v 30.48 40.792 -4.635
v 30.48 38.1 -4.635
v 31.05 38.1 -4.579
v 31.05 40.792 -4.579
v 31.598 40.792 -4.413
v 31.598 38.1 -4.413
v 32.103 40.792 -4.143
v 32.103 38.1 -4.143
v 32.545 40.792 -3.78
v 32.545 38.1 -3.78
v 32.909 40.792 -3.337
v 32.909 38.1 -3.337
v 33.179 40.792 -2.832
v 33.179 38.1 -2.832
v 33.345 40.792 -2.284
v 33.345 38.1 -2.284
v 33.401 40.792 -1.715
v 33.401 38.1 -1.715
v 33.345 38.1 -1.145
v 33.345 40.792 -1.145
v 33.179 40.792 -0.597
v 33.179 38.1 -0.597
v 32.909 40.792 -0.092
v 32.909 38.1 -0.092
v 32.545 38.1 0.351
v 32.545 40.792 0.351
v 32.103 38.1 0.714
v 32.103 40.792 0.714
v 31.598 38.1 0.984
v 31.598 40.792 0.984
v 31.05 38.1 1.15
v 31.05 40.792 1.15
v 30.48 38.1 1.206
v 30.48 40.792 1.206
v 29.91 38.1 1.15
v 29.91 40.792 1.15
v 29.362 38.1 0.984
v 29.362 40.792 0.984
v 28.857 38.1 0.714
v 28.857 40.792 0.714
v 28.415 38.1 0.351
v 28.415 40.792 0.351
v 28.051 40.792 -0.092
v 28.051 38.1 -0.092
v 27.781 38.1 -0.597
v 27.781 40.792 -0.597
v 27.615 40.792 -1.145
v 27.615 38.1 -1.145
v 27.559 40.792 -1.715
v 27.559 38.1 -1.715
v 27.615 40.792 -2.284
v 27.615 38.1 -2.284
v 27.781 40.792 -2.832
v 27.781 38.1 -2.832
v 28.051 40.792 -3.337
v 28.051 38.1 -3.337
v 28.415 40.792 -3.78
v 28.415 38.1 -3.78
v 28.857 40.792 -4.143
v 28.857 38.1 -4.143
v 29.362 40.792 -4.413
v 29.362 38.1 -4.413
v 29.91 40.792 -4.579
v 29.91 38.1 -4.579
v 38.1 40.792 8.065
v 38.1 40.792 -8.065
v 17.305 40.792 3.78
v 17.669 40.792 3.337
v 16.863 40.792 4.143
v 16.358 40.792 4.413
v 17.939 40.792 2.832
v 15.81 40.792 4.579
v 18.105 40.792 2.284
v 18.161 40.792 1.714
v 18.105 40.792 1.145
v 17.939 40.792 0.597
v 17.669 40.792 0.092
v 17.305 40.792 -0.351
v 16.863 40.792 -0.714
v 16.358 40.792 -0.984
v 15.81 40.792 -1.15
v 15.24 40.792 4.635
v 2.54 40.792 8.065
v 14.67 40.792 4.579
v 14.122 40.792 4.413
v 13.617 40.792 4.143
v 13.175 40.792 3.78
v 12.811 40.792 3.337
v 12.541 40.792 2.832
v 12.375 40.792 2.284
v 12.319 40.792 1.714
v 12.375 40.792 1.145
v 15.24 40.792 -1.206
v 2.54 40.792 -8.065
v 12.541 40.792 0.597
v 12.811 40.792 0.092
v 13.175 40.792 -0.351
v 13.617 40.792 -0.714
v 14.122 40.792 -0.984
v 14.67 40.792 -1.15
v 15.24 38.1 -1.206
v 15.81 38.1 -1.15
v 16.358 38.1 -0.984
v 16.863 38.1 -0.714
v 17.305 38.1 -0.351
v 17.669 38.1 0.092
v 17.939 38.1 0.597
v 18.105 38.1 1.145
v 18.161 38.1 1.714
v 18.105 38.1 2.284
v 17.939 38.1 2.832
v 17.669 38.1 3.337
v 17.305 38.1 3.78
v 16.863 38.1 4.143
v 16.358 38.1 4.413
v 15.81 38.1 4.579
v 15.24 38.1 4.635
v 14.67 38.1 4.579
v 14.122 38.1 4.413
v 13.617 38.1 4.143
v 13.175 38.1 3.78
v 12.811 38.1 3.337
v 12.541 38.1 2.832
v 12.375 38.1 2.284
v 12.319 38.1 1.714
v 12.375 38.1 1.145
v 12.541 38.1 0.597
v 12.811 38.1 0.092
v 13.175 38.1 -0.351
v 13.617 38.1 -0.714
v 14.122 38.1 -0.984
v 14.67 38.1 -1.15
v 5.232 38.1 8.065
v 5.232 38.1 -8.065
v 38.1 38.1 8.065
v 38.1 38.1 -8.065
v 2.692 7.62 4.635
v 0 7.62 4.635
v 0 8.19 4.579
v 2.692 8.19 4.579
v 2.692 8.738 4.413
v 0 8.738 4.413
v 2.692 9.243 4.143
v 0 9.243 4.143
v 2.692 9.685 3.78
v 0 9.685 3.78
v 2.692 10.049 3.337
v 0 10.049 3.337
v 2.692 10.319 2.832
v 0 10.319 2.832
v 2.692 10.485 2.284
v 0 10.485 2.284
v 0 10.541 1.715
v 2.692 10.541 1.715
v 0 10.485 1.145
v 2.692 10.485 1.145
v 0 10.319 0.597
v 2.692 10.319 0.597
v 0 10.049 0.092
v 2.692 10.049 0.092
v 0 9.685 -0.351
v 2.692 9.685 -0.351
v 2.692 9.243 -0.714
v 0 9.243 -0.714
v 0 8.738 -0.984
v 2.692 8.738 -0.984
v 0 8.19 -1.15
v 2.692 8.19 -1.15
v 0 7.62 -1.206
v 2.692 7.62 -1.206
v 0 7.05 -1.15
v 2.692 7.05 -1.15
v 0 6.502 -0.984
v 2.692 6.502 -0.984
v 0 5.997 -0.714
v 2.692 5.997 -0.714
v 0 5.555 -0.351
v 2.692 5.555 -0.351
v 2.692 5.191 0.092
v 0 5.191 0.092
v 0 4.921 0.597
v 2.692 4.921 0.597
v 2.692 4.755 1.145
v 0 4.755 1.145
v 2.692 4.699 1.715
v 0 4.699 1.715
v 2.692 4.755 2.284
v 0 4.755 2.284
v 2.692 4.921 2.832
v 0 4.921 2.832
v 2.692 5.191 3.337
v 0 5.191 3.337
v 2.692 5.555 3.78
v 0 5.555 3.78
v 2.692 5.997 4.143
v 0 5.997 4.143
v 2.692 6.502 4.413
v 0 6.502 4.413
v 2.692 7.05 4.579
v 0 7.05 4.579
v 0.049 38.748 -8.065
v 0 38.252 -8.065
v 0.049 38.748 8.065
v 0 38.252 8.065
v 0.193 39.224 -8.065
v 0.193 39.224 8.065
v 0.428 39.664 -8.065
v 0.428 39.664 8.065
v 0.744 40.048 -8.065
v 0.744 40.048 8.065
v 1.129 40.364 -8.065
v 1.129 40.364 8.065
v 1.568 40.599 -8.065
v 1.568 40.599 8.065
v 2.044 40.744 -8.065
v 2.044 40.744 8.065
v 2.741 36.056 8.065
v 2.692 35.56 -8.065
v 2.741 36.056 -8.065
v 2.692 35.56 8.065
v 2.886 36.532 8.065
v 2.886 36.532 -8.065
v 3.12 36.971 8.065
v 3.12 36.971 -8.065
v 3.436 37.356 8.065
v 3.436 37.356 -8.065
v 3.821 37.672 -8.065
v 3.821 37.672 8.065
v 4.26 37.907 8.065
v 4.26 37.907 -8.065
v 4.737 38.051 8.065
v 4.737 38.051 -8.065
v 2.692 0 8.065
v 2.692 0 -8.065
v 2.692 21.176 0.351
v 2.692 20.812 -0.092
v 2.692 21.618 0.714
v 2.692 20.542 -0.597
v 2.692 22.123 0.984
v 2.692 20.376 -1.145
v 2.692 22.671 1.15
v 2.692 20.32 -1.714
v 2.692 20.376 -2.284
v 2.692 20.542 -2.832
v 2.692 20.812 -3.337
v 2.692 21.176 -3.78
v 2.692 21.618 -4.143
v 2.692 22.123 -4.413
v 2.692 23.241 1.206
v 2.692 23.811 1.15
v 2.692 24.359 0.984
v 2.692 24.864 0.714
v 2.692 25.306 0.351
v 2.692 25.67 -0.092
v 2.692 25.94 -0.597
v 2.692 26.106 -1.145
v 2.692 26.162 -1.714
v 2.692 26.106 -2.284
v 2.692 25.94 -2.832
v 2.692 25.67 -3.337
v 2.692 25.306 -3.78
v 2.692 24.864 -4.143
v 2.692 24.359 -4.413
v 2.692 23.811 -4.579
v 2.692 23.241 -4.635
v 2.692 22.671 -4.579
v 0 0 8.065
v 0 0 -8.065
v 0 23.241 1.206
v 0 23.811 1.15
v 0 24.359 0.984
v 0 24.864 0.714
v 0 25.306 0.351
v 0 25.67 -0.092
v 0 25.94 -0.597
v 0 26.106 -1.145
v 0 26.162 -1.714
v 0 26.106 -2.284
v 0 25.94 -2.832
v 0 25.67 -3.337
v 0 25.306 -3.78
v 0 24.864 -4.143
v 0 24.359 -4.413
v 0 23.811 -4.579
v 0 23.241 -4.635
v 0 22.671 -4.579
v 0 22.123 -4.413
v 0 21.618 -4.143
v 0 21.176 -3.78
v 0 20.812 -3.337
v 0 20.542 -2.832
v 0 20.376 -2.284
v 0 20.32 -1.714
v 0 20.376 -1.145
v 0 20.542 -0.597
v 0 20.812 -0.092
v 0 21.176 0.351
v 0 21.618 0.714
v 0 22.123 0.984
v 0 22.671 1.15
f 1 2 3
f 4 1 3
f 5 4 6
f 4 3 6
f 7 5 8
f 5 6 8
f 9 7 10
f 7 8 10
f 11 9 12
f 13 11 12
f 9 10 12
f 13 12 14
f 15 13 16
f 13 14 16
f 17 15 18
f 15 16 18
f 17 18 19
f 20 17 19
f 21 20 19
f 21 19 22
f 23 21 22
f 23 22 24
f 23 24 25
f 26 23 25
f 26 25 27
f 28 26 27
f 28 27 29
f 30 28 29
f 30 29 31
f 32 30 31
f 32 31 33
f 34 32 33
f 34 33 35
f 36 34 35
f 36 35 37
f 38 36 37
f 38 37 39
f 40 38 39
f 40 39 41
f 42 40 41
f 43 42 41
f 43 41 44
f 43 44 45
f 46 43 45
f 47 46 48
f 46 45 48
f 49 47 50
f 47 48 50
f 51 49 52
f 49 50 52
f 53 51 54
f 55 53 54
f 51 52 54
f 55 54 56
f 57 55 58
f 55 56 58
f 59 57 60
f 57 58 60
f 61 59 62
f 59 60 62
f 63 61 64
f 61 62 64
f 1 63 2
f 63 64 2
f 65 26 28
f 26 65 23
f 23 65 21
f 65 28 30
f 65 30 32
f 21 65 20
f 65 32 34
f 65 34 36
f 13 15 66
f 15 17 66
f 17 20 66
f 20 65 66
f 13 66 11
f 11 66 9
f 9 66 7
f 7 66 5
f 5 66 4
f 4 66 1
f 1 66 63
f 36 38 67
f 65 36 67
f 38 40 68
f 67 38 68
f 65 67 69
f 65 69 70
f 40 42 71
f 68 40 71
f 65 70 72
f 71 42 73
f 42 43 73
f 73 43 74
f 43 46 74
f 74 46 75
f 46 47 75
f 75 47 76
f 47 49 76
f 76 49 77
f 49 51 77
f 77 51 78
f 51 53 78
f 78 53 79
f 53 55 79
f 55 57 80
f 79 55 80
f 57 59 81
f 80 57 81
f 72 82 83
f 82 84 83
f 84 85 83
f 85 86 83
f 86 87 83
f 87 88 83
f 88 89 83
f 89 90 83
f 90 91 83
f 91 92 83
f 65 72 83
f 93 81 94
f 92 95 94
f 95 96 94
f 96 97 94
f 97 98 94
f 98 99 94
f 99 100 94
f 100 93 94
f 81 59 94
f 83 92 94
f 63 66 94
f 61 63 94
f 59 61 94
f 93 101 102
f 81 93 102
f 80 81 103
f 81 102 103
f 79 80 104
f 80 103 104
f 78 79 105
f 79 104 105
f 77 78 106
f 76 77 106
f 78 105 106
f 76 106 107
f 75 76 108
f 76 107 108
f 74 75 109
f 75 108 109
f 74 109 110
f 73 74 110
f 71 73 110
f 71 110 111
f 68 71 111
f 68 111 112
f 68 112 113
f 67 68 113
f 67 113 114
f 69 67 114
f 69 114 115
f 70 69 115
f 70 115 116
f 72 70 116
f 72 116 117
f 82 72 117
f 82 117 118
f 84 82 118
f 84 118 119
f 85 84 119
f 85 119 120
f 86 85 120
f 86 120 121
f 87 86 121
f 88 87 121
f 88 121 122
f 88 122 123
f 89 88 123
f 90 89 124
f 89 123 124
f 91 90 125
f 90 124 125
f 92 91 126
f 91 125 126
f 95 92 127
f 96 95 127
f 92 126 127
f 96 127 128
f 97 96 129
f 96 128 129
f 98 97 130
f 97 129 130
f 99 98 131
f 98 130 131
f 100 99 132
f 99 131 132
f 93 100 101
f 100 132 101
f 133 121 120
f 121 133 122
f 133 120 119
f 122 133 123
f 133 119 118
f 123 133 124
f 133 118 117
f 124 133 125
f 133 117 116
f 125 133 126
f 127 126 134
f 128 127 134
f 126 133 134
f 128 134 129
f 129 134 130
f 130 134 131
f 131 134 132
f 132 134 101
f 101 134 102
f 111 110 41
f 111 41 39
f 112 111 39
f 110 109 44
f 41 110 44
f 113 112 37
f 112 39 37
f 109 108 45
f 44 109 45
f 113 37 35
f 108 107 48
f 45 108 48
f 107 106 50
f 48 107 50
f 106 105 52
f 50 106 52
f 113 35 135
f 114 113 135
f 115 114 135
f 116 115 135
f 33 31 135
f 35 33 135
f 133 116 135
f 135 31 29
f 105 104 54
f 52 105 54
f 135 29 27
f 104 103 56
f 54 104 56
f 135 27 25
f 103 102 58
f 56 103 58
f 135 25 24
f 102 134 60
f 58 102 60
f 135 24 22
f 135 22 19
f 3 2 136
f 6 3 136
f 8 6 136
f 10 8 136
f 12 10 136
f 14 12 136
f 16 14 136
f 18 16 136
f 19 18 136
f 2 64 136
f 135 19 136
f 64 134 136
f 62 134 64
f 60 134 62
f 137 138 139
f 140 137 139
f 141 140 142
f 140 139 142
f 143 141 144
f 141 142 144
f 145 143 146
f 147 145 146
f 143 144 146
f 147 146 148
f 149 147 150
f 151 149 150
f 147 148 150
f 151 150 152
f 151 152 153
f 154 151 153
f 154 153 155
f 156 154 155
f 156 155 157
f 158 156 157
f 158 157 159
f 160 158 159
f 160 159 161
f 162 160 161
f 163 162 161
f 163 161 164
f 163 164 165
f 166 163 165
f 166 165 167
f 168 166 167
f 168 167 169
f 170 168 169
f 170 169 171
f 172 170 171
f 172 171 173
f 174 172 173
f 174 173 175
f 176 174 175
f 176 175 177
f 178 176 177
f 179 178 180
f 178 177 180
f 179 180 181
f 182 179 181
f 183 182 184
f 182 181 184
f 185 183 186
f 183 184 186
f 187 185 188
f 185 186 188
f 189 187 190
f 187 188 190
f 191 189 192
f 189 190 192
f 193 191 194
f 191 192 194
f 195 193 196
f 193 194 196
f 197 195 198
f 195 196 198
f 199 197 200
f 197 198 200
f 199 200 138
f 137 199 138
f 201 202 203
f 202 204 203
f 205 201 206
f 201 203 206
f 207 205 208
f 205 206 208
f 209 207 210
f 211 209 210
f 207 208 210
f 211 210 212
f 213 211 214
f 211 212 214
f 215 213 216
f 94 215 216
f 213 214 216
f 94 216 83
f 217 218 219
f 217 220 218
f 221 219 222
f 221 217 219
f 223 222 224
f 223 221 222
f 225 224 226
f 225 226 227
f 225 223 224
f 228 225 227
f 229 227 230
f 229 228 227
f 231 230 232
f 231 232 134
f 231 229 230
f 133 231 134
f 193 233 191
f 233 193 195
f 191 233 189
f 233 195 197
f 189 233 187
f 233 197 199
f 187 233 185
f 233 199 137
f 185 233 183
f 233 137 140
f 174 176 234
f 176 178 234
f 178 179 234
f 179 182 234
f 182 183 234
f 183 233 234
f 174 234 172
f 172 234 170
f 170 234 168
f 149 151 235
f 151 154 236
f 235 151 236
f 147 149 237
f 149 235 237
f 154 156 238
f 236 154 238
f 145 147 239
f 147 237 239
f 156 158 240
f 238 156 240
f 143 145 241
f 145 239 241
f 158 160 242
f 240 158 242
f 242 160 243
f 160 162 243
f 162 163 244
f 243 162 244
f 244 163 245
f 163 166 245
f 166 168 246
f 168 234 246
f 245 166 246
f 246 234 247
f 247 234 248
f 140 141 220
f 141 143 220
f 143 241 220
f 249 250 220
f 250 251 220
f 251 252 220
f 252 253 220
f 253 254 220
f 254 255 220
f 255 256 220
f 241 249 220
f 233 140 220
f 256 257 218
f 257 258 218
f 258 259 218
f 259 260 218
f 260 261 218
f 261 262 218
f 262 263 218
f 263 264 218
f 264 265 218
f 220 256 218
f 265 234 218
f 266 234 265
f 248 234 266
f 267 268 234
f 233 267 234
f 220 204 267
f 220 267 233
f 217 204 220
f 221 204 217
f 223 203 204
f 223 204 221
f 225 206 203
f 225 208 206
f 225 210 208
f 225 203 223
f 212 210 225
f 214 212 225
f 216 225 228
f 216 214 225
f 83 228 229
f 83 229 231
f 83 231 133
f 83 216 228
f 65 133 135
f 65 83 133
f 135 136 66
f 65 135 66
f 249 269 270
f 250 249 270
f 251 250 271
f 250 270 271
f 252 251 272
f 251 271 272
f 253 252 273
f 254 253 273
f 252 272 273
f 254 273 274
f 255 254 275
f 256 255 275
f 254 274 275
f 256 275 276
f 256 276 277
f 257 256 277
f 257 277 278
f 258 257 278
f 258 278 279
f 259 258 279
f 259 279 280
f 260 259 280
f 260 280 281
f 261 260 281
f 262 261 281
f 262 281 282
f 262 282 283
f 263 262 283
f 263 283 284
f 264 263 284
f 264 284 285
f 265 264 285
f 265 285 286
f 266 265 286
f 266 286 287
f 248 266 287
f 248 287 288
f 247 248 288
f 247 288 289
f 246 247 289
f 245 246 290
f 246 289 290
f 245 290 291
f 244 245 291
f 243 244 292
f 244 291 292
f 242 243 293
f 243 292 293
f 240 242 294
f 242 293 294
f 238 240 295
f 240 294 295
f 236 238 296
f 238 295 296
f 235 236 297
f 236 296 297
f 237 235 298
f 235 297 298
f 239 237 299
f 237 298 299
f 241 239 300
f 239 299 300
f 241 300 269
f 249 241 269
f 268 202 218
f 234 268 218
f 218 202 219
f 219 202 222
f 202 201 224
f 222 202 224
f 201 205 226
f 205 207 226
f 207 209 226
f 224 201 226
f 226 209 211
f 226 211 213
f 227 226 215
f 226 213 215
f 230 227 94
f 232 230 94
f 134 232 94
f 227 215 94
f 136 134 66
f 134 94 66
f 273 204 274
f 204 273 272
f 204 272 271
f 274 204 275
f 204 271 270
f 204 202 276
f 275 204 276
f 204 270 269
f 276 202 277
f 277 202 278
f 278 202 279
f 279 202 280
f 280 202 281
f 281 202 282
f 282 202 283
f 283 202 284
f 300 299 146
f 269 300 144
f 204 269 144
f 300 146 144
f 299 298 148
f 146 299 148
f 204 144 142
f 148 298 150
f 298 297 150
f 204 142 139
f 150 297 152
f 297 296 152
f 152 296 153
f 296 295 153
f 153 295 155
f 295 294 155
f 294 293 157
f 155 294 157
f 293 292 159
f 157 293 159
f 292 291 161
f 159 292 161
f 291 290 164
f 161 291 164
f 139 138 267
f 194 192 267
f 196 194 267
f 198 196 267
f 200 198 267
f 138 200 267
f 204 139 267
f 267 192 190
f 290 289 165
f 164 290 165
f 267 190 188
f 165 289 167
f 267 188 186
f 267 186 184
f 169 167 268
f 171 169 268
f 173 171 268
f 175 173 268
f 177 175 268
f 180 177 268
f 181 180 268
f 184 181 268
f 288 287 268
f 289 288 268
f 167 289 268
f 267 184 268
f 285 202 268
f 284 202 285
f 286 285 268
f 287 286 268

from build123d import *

# Parameters (mm, degrees)
BOSS_EXTRUDE1_DEPTH      = 8.0645
BOSS_EXTRUDE1_DEPTH_BACK = 8.0645
CUT_EXTRUDE1_REACH       = 58.397
SKETCH2_R                = 2.921
CUT_EXTRUDE2_REACH       = 56.482
SKETCH5_R                = 2.921
FILLET1_R                = 2.54


with BuildPart() as part:
    # Sketch1 → Boss-Extrude1 (new, two sides: drawn at the far end of the back side and taken through both)
    with BuildSketch(Plane.XY.offset(-BOSS_EXTRUDE1_DEPTH_BACK)):
        Polygon((0, 0), (2.6924, 0), (2.6924, 38.1), (38.1, 38.1), (38.1, 40.7924), (0, 40.7924), (0, 38.1), align=None)
    extrude(amount=BOSS_EXTRUDE1_DEPTH + BOSS_EXTRUDE1_DEPTH_BACK)

    # Sketch2 → Cut-Extrude1 (cut, up to next)
    with BuildSketch(Plane.ZY, mode=Mode.PRIVATE) as cut_extrude1_sk1:
        with Locations((1.7145, 7.62)):
            Circle(SKETCH2_R)
    cut_extrude1_tool1 = extrude(cut_extrude1_sk1.sketch, amount=-CUT_EXTRUDE1_REACH, mode=Mode.PRIVATE) & part.part
    # Sketch2 → Cut-Extrude1 (cut, up to next)
    with BuildSketch(Plane.ZY, mode=Mode.PRIVATE) as cut_extrude1_sk2:
        with Locations((-1.7145, 23.241)):
            Circle(SKETCH2_R)
    cut_extrude1_tool2 = extrude(cut_extrude1_sk2.sketch, amount=-CUT_EXTRUDE1_REACH, mode=Mode.PRIVATE) & part.part
    add(cut_extrude1_tool1.solids().sort_by_distance((0, 7.62, 1.7145))[0], mode=Mode.SUBTRACT)
    add(cut_extrude1_tool2.solids().sort_by_distance((0, 23.241, -1.7145))[0], mode=Mode.SUBTRACT)

    # Sketch5 → Cut-Extrude2 (cut, up to next)
    with BuildSketch(Plane.XZ.offset(-38.1), mode=Mode.PRIVATE) as cut_extrude2_sk1:
        with Locations((30.48, -1.7145)):
            Circle(SKETCH5_R)
    cut_extrude2_tool1 = extrude(cut_extrude2_sk1.sketch, amount=-CUT_EXTRUDE2_REACH, mode=Mode.PRIVATE) & part.part
    # Sketch5 → Cut-Extrude2 (cut, up to next)
    with BuildSketch(Plane.XZ.offset(-38.1), mode=Mode.PRIVATE) as cut_extrude2_sk2:
        with Locations((15.24, 1.7145)):
            Circle(SKETCH5_R)
    cut_extrude2_tool2 = extrude(cut_extrude2_sk2.sketch, amount=-CUT_EXTRUDE2_REACH, mode=Mode.PRIVATE) & part.part
    add(cut_extrude2_tool1.solids().sort_by_distance((30.48, 38.1, -1.7145))[0], mode=Mode.SUBTRACT)
    add(cut_extrude2_tool2.solids().sort_by_distance((15.24, 38.1, 1.7145))[0], mode=Mode.SUBTRACT)

    # Fillet1
    fillet1_edges = [part.edges().sort_by_distance(p)[0] for p in [
        (0, 40.7924, 0),
        (2.6924, 38.1, 0),
    ]]
    fillet(fillet1_edges, radius=FILLET1_R)


solid = part.part
